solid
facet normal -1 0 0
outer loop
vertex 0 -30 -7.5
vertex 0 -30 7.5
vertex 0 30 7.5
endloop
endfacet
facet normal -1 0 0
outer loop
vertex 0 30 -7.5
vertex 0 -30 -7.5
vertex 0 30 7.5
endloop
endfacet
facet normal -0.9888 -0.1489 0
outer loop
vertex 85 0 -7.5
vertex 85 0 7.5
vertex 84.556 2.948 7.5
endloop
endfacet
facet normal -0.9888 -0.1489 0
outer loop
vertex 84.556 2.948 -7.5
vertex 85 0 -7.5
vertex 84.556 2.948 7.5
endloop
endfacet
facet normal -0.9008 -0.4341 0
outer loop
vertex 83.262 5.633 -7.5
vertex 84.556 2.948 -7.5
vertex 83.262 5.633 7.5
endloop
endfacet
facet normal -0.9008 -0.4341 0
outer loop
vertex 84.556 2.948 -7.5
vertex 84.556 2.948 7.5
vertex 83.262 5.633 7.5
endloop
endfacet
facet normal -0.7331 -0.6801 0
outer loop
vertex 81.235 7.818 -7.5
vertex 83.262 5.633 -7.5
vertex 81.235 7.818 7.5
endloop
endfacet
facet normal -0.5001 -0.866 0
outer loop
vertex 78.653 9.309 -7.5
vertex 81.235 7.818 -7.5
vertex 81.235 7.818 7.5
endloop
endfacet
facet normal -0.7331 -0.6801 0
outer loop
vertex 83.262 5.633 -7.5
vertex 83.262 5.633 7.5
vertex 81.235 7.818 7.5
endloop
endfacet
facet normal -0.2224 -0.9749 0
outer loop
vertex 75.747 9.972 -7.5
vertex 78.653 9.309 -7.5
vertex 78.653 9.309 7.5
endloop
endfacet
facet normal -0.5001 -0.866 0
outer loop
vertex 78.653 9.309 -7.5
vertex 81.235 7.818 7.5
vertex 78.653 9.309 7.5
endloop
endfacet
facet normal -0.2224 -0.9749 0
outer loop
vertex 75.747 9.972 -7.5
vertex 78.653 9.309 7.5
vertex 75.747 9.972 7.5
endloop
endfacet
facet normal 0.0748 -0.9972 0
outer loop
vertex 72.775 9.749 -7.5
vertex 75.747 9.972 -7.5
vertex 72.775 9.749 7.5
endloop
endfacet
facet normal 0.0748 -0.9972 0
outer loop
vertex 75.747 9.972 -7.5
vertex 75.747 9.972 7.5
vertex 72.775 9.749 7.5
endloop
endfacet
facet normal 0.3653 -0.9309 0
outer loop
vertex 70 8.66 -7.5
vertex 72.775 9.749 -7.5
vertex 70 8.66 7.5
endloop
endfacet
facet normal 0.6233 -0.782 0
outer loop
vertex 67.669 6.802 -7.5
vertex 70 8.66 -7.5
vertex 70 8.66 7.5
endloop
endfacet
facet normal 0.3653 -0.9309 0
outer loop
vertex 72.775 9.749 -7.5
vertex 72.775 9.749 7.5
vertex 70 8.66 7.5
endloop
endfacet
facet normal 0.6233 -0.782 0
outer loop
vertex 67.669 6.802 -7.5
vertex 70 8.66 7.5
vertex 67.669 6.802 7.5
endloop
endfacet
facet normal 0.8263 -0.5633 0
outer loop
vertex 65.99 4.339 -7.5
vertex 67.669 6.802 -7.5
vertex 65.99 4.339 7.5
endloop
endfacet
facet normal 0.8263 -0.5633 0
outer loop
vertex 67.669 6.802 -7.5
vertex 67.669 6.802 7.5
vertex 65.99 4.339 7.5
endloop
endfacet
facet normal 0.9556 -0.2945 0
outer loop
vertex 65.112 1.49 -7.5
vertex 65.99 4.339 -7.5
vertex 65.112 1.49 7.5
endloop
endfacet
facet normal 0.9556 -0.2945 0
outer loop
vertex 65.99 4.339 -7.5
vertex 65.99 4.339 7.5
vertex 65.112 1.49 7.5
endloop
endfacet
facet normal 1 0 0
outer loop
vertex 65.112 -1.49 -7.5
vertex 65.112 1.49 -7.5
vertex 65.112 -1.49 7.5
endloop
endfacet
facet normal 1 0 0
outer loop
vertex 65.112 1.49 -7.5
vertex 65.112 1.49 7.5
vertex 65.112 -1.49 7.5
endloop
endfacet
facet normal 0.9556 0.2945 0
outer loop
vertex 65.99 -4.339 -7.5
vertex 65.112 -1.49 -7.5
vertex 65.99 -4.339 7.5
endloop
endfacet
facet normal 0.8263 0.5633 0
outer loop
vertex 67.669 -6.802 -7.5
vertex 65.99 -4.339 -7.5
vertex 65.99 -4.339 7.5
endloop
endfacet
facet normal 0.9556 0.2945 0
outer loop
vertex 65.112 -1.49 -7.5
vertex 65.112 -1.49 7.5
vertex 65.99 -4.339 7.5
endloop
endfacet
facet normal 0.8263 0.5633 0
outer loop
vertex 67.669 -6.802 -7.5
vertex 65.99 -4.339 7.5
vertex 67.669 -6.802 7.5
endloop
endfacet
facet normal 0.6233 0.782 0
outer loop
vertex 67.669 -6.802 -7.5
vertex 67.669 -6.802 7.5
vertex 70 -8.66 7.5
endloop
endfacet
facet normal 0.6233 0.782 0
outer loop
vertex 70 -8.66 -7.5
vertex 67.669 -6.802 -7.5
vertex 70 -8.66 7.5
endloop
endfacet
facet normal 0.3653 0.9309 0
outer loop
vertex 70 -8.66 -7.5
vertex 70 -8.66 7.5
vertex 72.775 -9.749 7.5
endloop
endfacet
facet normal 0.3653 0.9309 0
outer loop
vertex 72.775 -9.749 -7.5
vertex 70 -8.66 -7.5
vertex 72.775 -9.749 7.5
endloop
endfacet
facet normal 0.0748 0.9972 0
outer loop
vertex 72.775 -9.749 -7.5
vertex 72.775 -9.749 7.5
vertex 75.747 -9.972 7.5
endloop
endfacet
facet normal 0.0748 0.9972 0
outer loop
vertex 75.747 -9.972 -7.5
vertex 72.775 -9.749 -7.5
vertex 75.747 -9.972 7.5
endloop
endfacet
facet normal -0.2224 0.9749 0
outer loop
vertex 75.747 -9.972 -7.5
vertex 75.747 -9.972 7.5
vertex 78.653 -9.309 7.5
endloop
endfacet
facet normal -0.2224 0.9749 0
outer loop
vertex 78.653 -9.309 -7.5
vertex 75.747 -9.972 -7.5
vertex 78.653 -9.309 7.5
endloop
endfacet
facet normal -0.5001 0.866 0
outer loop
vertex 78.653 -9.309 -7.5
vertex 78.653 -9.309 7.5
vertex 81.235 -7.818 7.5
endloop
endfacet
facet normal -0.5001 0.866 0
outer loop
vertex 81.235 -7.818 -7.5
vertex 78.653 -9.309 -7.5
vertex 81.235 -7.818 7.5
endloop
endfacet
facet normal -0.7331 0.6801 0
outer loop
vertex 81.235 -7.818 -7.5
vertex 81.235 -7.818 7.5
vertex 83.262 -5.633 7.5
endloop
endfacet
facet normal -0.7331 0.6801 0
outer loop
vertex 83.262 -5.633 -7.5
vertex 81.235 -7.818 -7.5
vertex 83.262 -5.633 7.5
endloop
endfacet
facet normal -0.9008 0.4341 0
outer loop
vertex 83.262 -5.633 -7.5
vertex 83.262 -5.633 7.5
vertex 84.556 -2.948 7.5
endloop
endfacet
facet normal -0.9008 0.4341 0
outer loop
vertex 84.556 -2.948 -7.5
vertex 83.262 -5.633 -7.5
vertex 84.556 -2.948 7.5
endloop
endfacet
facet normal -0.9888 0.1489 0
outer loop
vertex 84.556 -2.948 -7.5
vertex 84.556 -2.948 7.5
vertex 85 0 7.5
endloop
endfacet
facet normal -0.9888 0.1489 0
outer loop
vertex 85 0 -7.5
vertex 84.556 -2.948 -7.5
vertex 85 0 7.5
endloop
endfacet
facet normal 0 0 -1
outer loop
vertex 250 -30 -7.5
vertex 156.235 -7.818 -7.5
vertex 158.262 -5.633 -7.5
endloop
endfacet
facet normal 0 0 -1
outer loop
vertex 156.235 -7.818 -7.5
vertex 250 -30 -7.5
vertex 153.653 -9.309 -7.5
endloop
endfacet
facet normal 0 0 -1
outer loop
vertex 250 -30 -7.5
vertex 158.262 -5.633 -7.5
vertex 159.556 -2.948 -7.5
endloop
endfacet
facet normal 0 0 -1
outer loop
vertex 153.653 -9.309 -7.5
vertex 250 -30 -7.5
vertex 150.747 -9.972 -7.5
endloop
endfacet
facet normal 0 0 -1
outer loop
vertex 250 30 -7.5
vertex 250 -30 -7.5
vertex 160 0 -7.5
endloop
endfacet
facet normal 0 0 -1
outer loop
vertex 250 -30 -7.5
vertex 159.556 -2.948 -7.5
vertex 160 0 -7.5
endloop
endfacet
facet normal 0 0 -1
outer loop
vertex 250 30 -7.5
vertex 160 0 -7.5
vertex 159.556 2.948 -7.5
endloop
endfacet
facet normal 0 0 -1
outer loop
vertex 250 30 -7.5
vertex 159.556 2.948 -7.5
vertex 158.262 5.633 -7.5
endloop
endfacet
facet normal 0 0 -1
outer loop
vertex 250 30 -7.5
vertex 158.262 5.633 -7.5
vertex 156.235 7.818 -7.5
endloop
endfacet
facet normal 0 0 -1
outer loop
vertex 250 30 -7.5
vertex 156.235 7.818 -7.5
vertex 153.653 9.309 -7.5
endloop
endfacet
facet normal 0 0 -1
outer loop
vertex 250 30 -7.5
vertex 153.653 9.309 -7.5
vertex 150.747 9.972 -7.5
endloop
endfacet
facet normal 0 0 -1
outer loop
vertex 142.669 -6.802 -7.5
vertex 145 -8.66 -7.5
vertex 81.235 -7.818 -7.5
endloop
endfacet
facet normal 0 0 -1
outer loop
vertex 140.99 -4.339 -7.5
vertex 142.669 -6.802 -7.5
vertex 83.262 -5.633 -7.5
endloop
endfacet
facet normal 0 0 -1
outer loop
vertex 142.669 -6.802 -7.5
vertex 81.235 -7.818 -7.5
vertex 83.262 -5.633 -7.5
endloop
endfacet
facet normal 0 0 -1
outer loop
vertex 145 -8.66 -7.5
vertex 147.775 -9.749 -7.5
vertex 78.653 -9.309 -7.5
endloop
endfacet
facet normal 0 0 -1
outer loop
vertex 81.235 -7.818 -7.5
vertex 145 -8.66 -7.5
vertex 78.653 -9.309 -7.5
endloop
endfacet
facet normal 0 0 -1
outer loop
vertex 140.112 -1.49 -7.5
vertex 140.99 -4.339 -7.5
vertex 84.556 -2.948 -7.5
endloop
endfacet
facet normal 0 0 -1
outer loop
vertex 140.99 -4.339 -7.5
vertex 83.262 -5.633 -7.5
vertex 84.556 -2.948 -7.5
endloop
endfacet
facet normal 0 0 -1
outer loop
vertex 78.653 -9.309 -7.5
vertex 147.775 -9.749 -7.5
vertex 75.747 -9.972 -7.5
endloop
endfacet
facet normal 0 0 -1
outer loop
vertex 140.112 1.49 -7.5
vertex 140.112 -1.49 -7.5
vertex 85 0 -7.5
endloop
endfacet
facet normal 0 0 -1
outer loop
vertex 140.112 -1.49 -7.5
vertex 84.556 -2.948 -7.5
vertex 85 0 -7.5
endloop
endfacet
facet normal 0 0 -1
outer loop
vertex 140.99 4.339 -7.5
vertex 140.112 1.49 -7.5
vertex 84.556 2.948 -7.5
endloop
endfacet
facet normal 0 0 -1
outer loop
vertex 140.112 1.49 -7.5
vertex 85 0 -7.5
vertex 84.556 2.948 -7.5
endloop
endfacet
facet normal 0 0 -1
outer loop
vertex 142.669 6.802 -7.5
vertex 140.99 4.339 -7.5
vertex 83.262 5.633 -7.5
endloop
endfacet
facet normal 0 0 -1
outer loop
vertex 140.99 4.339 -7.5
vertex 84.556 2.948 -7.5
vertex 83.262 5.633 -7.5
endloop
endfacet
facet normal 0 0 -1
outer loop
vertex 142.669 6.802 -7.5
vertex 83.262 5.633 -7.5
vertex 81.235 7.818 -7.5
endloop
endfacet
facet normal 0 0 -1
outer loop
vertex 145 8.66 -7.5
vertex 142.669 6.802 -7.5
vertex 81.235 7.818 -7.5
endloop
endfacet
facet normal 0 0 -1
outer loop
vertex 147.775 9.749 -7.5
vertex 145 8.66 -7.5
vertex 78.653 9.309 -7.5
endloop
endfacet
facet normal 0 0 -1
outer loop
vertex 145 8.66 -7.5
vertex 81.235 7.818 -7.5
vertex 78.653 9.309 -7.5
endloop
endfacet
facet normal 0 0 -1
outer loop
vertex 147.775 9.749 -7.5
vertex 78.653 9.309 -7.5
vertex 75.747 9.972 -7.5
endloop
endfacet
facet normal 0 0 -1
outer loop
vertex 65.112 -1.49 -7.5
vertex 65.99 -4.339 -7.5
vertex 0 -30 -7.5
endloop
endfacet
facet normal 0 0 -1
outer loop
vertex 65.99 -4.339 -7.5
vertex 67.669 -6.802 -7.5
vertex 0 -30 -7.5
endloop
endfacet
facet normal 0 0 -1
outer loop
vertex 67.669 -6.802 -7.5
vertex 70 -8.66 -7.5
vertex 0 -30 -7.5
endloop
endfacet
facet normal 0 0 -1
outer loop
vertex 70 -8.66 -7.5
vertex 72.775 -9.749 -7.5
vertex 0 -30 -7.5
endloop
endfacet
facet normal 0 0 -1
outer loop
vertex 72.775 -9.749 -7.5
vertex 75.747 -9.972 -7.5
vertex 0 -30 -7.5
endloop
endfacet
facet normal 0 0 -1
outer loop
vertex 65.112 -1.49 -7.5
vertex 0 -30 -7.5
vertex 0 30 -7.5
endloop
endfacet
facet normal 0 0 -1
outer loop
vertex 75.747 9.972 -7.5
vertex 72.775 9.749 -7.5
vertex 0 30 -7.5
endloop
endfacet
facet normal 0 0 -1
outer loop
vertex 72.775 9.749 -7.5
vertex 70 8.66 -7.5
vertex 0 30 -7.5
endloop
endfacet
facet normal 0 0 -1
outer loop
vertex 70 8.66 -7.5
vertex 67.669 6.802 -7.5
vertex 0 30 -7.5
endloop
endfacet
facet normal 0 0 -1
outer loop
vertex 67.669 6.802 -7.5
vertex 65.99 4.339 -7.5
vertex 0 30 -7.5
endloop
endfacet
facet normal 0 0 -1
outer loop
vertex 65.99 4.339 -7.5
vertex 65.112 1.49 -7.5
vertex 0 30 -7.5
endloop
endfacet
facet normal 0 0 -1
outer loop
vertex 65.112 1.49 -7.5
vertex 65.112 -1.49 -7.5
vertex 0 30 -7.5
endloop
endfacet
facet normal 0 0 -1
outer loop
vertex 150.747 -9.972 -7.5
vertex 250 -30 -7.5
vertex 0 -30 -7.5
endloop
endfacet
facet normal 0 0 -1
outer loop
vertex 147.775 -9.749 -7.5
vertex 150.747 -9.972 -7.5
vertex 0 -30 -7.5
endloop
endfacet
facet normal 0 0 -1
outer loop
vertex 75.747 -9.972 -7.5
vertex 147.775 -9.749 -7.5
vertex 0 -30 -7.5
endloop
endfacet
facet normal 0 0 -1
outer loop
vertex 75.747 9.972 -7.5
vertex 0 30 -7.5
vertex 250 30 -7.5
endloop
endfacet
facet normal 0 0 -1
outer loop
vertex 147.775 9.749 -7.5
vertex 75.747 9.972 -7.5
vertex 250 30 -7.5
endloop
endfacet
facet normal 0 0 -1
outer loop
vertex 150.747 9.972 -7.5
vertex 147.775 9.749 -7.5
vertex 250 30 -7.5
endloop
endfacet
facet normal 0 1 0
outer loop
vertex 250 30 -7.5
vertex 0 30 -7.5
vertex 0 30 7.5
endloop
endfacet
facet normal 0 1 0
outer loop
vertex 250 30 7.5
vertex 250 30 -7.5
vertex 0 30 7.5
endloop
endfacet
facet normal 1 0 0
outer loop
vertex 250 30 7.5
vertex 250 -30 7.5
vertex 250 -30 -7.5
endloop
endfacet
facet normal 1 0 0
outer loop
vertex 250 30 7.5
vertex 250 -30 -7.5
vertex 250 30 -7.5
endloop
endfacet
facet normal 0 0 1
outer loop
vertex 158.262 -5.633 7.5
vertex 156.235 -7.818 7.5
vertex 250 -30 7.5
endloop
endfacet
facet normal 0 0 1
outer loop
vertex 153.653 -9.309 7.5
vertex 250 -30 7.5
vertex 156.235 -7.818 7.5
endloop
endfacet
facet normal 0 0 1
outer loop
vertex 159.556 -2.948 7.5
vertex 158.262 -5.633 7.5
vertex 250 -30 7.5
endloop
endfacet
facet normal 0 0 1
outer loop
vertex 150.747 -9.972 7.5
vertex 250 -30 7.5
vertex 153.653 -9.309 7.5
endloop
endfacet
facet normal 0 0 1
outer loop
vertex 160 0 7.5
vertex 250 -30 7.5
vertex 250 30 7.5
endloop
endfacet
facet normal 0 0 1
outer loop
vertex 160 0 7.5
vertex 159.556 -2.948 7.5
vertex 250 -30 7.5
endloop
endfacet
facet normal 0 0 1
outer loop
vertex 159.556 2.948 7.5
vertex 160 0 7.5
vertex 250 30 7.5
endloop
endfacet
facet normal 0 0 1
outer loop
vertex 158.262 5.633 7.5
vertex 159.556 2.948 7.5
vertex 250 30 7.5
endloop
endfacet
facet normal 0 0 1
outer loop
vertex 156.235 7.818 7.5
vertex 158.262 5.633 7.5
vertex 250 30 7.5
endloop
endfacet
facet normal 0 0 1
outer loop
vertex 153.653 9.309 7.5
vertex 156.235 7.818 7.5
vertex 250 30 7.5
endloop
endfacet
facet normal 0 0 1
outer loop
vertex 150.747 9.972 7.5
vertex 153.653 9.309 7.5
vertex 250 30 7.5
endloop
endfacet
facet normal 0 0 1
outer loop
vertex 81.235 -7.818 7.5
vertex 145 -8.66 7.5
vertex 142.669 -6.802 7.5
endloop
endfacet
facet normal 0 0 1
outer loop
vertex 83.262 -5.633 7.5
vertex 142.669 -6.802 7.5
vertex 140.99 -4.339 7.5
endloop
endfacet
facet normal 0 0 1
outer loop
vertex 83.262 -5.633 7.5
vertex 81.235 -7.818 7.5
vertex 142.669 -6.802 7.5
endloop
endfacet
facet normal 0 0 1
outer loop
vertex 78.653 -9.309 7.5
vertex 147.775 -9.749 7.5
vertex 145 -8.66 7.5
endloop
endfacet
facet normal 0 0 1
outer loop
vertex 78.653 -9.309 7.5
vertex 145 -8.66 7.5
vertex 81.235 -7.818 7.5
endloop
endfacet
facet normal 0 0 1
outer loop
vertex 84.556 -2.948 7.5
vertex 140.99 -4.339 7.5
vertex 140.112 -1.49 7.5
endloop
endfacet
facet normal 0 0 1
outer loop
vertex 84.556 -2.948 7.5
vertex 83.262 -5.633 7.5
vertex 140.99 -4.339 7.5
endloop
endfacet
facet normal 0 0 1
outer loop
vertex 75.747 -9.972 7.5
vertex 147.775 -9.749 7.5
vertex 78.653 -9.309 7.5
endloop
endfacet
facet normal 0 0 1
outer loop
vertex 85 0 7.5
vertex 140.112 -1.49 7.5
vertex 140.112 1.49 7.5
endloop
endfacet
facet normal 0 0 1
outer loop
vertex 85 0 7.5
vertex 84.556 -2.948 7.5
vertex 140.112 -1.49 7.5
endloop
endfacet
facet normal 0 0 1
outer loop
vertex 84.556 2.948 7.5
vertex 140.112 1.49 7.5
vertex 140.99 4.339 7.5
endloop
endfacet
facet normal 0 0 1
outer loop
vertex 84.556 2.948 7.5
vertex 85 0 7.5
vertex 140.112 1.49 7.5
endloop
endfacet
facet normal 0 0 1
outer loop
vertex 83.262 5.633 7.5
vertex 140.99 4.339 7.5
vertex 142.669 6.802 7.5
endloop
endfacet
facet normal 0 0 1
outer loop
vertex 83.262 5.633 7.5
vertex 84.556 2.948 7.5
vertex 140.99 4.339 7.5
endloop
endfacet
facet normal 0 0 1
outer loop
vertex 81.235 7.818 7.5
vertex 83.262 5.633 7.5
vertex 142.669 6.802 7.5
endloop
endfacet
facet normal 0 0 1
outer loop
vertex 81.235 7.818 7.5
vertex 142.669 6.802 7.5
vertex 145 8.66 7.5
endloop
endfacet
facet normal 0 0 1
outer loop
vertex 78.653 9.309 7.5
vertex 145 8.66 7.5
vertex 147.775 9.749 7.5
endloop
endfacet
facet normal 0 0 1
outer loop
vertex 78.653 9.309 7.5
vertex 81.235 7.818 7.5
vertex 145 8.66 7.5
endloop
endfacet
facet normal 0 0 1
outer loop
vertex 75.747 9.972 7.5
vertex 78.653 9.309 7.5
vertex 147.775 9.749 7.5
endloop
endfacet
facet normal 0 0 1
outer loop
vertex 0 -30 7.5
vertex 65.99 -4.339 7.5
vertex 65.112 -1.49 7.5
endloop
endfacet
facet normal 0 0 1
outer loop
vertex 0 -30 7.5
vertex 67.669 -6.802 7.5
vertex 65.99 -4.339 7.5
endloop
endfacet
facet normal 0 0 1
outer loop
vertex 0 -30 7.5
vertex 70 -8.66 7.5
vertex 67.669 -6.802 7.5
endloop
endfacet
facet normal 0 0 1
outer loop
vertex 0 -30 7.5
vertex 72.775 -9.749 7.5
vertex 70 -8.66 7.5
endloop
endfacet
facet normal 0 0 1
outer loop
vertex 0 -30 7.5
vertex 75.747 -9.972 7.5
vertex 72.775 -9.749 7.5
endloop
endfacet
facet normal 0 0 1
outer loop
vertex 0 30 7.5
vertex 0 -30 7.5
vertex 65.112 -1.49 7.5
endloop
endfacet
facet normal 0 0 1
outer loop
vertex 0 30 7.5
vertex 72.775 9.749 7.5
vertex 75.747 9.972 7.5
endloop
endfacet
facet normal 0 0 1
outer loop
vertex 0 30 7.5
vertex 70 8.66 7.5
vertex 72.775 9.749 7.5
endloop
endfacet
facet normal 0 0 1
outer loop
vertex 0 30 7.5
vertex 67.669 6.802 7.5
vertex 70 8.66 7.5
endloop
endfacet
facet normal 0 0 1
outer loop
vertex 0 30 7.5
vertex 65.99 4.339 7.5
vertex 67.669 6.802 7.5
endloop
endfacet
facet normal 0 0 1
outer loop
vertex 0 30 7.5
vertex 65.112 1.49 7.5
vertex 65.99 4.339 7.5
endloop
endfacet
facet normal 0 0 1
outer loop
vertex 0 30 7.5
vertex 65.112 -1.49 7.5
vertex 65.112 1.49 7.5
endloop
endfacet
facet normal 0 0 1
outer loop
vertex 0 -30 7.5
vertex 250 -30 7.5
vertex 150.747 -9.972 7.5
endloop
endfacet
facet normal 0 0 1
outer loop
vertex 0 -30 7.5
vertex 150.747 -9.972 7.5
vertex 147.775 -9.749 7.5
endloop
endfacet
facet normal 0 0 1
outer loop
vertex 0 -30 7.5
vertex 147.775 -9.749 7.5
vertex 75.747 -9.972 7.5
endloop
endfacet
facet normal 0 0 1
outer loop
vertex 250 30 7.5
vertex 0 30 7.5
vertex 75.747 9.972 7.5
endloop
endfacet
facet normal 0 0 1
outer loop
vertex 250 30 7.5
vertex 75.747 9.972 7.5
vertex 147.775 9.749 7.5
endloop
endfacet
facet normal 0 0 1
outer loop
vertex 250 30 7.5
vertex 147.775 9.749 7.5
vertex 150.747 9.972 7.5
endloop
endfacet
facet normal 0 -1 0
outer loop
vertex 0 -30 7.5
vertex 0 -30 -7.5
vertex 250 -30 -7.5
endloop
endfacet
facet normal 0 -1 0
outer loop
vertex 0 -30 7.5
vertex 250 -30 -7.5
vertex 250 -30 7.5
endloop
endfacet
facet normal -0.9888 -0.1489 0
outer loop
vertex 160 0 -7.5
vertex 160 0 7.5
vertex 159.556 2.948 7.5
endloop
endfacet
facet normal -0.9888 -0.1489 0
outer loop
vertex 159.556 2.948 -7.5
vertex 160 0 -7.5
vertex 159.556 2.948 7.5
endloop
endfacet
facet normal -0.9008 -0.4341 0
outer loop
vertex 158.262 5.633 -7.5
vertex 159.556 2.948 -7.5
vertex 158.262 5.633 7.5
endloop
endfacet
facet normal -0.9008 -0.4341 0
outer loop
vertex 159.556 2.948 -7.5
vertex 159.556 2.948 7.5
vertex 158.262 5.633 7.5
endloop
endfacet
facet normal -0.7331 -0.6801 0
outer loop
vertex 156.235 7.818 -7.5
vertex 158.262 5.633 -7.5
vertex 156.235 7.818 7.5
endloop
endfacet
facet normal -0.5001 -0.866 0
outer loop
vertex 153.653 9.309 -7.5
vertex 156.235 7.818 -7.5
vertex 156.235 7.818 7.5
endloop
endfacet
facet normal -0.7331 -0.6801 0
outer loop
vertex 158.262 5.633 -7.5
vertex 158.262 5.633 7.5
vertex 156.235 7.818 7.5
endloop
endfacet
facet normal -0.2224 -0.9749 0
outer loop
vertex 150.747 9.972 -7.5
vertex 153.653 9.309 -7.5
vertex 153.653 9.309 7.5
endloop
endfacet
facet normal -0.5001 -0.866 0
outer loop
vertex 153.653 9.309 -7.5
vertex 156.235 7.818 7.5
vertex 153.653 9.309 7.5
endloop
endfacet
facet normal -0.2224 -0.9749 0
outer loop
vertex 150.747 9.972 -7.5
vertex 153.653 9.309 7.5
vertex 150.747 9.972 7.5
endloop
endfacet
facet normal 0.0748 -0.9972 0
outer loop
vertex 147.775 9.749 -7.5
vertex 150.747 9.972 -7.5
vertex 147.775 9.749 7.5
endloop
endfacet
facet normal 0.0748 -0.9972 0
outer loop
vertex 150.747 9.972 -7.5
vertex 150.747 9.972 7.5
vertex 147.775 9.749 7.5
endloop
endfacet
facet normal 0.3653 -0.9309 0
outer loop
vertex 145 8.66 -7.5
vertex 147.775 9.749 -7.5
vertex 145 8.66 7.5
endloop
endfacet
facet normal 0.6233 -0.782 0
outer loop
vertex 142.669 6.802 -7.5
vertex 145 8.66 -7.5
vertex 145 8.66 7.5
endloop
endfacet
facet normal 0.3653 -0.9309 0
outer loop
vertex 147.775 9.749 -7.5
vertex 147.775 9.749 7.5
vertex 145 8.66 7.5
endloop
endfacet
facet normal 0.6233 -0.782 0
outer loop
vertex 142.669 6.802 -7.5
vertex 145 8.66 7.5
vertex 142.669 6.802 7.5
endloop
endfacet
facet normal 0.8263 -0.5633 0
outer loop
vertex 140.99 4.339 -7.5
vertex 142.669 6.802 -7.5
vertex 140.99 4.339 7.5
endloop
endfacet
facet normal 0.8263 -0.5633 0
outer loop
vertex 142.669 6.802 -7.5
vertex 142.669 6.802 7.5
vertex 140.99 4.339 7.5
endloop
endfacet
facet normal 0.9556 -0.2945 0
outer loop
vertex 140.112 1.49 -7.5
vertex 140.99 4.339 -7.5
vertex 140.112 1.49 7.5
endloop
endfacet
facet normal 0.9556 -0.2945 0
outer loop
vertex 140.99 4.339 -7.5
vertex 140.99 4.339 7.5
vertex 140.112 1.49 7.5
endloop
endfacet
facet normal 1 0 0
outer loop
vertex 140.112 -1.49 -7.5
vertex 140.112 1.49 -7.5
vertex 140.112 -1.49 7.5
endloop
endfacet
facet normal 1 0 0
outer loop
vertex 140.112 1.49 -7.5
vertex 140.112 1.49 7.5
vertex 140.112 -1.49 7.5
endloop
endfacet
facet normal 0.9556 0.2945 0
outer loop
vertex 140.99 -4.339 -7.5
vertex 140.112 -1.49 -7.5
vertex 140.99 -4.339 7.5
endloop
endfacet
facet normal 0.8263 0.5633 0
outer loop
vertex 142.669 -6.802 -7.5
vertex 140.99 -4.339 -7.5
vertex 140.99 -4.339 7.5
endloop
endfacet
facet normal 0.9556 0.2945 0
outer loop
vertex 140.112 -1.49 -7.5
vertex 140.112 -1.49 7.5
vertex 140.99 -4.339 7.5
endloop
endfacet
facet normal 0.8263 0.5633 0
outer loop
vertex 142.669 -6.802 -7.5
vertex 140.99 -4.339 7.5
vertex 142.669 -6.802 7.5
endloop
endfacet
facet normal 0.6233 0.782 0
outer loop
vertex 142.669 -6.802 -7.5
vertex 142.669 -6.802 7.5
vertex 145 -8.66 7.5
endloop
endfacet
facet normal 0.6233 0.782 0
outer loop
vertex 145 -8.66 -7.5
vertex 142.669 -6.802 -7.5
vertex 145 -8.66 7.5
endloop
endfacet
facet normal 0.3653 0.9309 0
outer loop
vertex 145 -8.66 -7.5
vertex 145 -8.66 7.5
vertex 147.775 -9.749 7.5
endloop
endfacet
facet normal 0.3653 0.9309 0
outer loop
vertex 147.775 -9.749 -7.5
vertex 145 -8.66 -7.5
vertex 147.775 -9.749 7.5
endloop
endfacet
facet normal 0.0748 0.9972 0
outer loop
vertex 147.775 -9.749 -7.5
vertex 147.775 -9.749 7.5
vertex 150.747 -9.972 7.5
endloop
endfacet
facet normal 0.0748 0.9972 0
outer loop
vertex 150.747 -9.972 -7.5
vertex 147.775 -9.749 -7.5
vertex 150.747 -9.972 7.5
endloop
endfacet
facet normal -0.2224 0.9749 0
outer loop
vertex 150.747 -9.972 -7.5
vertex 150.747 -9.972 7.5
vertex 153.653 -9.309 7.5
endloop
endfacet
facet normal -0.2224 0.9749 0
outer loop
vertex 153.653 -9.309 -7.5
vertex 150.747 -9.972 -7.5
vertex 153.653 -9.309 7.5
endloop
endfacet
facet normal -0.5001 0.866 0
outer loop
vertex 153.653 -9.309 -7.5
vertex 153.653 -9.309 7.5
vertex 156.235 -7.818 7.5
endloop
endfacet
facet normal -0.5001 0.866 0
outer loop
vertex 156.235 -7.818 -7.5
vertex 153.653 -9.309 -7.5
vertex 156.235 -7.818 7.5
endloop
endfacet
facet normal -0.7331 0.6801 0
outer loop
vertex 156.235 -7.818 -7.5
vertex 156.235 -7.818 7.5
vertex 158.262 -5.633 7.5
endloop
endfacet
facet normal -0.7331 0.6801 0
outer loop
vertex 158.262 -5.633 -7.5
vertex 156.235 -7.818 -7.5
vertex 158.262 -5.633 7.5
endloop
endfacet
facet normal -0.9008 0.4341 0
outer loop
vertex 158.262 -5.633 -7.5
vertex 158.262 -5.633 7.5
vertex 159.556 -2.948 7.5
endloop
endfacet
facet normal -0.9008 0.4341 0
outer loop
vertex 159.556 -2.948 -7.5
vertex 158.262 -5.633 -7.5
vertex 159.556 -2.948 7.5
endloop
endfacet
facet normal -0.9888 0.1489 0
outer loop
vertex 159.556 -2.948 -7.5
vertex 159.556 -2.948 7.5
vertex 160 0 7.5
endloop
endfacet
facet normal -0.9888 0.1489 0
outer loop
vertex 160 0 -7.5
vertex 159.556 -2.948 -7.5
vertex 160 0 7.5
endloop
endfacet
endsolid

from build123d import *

# Parameters (mm, degrees)
PLAT_W                      = 60
PLAT_H                      = 15
EL_MENT_M_CANO_SOUD_1_DEPTH = 250
ESQUISSE2_R                 = 10
ENL_V_MAT_EXTRU_1_DEPTH     = 16


with BuildPart() as part:
    # plat → Elément mécano-soudé1 (new body)
    with BuildSketch(Plane.YZ):
        Rectangle(PLAT_W, PLAT_H)
    extrude(amount=EL_MENT_M_CANO_SOUD_1_DEPTH)

    # Esquisse2 → Enlèv. mat.-Extru.1 (cut, through all)
    with BuildSketch(Plane.XY.offset(7.5)):
        with Locations((150, 0)):
            Circle(ESQUISSE2_R)
        with Locations((75, 0)):
            Circle(ESQUISSE2_R)
    extrude(amount=-ENL_V_MAT_EXTRU_1_DEPTH, mode=Mode.SUBTRACT)


solid = part.part
